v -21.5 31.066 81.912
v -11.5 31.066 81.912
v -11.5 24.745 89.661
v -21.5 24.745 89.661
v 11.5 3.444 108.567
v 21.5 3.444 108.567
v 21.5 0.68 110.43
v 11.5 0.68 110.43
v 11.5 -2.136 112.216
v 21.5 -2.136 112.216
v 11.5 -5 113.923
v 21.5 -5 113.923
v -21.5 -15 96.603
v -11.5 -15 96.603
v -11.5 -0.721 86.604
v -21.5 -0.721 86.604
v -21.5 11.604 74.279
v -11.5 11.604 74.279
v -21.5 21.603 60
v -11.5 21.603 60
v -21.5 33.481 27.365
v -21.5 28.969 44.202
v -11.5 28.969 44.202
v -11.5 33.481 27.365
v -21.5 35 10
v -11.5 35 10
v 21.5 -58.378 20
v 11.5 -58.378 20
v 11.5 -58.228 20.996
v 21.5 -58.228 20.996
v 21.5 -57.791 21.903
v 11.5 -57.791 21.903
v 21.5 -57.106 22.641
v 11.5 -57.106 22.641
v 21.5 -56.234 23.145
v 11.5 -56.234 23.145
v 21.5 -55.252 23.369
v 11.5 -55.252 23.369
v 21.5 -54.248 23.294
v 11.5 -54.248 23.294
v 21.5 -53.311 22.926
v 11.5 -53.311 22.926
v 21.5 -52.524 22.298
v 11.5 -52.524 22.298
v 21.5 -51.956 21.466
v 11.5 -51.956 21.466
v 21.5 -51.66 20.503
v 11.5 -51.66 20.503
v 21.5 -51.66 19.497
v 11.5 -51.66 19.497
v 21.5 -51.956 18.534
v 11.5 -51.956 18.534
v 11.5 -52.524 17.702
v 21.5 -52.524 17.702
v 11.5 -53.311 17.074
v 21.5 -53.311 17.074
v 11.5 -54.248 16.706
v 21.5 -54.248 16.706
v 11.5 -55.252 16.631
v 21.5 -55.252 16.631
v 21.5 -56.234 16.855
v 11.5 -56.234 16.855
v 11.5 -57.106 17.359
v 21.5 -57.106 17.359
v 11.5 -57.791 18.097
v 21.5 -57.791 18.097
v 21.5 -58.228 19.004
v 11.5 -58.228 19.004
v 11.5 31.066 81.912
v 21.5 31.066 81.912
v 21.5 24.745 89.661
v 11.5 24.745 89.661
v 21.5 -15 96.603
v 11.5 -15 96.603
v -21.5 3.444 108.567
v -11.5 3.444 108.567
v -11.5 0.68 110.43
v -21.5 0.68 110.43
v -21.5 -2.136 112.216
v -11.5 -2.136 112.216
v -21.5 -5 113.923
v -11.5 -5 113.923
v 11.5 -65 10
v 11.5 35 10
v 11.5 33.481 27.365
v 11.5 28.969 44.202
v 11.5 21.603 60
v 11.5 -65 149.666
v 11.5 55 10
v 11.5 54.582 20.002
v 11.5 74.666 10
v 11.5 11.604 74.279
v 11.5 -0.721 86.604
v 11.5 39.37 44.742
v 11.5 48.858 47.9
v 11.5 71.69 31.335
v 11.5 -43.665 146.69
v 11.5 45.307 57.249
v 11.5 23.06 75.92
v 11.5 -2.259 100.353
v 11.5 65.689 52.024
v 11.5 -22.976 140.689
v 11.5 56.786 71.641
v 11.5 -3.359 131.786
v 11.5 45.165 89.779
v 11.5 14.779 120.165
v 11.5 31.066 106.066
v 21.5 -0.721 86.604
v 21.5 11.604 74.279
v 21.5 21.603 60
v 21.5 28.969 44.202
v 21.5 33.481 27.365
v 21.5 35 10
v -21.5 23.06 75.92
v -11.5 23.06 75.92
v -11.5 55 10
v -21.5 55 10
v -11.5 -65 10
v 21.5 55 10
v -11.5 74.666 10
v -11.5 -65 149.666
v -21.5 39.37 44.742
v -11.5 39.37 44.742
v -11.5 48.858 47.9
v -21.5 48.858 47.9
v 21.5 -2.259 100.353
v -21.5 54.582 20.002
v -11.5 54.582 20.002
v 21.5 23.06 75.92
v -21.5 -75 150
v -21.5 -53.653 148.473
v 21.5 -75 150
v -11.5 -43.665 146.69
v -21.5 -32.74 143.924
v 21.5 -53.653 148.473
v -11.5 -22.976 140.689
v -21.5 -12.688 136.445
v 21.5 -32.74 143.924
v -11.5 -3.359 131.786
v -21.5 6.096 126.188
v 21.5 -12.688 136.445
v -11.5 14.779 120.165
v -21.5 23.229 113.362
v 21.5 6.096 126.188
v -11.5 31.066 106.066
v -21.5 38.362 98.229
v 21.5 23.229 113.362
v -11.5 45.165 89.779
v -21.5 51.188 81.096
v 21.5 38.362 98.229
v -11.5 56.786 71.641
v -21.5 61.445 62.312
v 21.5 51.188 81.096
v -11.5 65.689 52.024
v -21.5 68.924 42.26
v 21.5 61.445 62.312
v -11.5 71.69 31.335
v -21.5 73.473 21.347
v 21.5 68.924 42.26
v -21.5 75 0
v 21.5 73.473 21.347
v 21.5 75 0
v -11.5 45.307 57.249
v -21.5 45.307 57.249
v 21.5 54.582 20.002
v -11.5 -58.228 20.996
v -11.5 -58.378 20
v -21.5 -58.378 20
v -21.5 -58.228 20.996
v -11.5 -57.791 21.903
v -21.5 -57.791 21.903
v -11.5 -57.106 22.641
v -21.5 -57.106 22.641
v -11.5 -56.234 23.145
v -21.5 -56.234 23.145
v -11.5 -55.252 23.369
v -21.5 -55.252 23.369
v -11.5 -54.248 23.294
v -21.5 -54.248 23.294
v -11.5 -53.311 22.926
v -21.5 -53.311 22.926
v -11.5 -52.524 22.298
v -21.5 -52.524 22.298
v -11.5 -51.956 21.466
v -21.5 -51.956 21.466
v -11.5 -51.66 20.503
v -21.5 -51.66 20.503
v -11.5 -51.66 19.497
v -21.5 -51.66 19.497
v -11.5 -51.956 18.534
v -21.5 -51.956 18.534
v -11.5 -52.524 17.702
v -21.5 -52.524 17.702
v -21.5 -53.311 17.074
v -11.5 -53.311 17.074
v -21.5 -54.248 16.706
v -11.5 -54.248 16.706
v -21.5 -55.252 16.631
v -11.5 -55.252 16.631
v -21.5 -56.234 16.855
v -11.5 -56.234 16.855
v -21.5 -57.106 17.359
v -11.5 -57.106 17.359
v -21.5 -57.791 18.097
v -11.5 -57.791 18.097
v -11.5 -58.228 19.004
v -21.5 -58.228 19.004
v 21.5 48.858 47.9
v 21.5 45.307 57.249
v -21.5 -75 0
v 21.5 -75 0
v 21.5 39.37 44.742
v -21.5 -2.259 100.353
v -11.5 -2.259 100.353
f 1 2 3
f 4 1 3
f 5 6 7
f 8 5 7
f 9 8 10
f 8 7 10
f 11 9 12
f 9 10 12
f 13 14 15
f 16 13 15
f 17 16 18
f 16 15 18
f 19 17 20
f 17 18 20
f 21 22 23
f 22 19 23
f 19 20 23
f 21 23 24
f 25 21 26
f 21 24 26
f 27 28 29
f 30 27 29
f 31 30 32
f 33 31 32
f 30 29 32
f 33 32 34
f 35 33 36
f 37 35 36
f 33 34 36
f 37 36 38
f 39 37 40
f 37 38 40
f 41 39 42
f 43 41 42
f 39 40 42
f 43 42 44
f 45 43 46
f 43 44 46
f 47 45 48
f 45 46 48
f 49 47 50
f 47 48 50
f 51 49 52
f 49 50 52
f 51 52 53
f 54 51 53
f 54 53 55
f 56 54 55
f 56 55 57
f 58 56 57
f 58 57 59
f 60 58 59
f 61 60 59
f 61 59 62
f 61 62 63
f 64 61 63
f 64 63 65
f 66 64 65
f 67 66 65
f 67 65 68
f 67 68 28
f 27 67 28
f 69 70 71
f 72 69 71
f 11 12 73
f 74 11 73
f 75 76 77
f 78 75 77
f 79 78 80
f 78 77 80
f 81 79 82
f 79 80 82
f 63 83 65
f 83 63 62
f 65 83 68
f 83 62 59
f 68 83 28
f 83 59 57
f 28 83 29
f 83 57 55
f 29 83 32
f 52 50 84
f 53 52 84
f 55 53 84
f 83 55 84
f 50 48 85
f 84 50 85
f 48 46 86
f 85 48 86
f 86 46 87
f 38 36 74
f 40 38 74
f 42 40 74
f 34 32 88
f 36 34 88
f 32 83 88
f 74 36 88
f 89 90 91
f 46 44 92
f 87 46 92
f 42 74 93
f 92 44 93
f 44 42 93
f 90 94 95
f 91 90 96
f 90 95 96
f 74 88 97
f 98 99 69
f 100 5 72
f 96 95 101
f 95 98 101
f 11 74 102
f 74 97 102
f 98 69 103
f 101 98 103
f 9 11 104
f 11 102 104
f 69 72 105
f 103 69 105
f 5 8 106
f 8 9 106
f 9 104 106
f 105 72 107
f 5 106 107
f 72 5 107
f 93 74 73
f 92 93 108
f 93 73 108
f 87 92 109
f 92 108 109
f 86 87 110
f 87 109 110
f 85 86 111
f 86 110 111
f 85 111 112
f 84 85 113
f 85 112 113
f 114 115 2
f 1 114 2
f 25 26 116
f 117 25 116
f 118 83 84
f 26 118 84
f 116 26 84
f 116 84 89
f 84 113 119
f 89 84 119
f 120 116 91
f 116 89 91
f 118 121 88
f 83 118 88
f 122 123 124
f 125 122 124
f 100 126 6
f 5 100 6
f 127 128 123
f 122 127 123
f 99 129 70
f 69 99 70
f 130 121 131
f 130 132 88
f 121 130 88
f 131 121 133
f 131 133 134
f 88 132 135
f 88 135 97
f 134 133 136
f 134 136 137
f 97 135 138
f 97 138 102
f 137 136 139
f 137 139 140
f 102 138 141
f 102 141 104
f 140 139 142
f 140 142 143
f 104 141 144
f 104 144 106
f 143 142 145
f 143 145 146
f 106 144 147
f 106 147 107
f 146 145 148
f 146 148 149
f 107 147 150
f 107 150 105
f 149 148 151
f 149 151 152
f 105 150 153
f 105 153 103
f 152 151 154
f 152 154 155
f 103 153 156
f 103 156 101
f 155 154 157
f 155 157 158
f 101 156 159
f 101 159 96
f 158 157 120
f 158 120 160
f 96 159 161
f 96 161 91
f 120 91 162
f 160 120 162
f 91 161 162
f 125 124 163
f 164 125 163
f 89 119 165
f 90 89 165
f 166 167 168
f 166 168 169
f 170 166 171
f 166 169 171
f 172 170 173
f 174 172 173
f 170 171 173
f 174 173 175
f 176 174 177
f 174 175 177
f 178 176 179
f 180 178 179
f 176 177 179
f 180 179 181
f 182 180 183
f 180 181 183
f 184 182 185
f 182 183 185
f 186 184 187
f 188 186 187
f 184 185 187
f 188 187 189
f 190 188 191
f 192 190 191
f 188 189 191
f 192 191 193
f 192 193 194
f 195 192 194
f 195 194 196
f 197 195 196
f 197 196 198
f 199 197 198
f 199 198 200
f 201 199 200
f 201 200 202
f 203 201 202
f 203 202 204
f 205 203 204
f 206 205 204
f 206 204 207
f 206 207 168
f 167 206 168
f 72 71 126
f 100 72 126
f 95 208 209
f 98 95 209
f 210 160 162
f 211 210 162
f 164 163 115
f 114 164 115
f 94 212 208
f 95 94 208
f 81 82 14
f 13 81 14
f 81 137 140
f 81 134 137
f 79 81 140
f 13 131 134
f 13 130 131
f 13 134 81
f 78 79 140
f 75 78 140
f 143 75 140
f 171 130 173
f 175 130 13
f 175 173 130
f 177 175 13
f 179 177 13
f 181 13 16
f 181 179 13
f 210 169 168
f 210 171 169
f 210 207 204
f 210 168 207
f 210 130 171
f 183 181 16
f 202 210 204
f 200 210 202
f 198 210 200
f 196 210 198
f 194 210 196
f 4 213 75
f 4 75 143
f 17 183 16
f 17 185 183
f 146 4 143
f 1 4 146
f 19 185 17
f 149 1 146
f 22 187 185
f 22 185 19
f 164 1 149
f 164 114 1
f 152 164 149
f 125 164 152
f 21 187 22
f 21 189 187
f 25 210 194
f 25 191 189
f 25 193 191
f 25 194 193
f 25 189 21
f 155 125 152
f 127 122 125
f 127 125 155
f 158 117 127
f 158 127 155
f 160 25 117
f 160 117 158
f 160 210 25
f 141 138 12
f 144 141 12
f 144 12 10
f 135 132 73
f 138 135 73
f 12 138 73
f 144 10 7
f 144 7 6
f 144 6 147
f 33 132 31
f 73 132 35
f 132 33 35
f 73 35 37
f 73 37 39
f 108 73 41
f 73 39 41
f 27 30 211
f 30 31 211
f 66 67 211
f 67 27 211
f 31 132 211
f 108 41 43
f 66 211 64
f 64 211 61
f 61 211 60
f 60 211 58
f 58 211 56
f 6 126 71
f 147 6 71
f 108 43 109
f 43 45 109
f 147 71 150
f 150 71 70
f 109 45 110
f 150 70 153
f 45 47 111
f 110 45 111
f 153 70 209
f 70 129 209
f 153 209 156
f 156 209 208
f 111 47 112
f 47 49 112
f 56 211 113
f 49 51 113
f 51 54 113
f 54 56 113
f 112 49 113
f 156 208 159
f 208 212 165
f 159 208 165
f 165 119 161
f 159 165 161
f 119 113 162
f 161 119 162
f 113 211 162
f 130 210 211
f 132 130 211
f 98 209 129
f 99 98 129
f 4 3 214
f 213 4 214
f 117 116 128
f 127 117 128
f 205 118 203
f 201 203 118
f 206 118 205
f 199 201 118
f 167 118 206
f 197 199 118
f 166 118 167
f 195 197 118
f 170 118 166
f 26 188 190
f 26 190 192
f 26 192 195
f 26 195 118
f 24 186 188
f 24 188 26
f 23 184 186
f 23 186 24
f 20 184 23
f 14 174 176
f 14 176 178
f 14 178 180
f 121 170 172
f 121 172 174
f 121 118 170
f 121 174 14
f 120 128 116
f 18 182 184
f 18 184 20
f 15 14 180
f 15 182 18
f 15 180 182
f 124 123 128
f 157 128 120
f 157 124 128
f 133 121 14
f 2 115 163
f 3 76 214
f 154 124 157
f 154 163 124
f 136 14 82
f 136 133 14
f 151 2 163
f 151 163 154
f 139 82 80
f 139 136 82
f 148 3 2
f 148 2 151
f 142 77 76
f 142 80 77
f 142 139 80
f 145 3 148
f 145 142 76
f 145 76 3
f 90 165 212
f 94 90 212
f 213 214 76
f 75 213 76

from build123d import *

# Parameters (mm, degrees)
F0_W     = 43
F0_H     = 150
F1_DEPTH = 150
F2_W     = 23
F2_H     = 140
F3_DEPTH = 140
F5_DEPTH = 43.001
F7_D     = 6.7564
F9_DEPTH = 43.001


with BuildPart() as f1:
    # F0 (on Top) → F1 (new body)
    with BuildSketch(Plane.XY):
        Rectangle(F0_W, F0_H)
    extrude(amount=F1_DEPTH)

    # F2 (on face) → F3 (cut)
    with BuildSketch(Plane.XY.offset(150)):
        with Locations((0, 5)):
            Rectangle(F2_W, F2_H)
    extrude(amount=-F3_DEPTH, mode=Mode.SUBTRACT)

    # F4 (on face) → F5 (cut, through all)
    with BuildSketch(Plane.YZ.offset(21.5)):
        with BuildLine():
            Line((75, 150), (-75, 150))
            ThreePointArc((-75, 150), (31.066017178, 106.066017178), (75, 0))
            Line((75, 0), (75, 150))
        make_face()
    extrude(amount=-F5_DEPTH, mode=Mode.SUBTRACT)

    # F7 (through all)
    with Locations(Plane.YZ.offset(21.5)):
        with Locations((-55, 20)):
            Hole(F7_D / 2)

    # F8 (on face) → F9 (cut, through all)
    with BuildSketch(Plane.YZ.offset(21.5)):
        with BuildLine():
            Line((-5, 113.9230484541), (-15, 96.6025403784))
            ThreePointArc((-15, 96.6025403784), (21.6025403784, 60), (35, 10))
            Line((35, 10), (55, 10))
            Line((55, 10), (54.5824738826, 20.0015968781))
            Line((54.5824738826, 20.0015968781), (39.3695273594, 44.7419308441))
            Line((39.3695273594, 44.7419308441), (48.8576662103, 47.9002881935))
            Line((48.8576662103, 47.9002881935), (45.3067125626, 57.248589012))
            Line((45.3067125626, 57.248589012), (23.0601812824, 75.9196819812))
            Line((23.0601812824, 75.9196819812), (31.0656523081, 81.9123803431))
            Line((31.0656523081, 81.9123803431), (24.7445969083, 89.6612033914))
            Line((24.7445969083, 89.6612033914), (-2.2593001309, 100.3526678075))
            Line((-2.2593001309, 100.3526678075), (3.4443998572, 108.5665466991))
            ThreePointArc((3.4443998572, 108.5665466991), (-0.7219789397, 111.3327982865), (-5, 113.9230484541))
        make_face()
    extrude(amount=-F9_DEPTH, mode=Mode.SUBTRACT)


solid = f1.part
